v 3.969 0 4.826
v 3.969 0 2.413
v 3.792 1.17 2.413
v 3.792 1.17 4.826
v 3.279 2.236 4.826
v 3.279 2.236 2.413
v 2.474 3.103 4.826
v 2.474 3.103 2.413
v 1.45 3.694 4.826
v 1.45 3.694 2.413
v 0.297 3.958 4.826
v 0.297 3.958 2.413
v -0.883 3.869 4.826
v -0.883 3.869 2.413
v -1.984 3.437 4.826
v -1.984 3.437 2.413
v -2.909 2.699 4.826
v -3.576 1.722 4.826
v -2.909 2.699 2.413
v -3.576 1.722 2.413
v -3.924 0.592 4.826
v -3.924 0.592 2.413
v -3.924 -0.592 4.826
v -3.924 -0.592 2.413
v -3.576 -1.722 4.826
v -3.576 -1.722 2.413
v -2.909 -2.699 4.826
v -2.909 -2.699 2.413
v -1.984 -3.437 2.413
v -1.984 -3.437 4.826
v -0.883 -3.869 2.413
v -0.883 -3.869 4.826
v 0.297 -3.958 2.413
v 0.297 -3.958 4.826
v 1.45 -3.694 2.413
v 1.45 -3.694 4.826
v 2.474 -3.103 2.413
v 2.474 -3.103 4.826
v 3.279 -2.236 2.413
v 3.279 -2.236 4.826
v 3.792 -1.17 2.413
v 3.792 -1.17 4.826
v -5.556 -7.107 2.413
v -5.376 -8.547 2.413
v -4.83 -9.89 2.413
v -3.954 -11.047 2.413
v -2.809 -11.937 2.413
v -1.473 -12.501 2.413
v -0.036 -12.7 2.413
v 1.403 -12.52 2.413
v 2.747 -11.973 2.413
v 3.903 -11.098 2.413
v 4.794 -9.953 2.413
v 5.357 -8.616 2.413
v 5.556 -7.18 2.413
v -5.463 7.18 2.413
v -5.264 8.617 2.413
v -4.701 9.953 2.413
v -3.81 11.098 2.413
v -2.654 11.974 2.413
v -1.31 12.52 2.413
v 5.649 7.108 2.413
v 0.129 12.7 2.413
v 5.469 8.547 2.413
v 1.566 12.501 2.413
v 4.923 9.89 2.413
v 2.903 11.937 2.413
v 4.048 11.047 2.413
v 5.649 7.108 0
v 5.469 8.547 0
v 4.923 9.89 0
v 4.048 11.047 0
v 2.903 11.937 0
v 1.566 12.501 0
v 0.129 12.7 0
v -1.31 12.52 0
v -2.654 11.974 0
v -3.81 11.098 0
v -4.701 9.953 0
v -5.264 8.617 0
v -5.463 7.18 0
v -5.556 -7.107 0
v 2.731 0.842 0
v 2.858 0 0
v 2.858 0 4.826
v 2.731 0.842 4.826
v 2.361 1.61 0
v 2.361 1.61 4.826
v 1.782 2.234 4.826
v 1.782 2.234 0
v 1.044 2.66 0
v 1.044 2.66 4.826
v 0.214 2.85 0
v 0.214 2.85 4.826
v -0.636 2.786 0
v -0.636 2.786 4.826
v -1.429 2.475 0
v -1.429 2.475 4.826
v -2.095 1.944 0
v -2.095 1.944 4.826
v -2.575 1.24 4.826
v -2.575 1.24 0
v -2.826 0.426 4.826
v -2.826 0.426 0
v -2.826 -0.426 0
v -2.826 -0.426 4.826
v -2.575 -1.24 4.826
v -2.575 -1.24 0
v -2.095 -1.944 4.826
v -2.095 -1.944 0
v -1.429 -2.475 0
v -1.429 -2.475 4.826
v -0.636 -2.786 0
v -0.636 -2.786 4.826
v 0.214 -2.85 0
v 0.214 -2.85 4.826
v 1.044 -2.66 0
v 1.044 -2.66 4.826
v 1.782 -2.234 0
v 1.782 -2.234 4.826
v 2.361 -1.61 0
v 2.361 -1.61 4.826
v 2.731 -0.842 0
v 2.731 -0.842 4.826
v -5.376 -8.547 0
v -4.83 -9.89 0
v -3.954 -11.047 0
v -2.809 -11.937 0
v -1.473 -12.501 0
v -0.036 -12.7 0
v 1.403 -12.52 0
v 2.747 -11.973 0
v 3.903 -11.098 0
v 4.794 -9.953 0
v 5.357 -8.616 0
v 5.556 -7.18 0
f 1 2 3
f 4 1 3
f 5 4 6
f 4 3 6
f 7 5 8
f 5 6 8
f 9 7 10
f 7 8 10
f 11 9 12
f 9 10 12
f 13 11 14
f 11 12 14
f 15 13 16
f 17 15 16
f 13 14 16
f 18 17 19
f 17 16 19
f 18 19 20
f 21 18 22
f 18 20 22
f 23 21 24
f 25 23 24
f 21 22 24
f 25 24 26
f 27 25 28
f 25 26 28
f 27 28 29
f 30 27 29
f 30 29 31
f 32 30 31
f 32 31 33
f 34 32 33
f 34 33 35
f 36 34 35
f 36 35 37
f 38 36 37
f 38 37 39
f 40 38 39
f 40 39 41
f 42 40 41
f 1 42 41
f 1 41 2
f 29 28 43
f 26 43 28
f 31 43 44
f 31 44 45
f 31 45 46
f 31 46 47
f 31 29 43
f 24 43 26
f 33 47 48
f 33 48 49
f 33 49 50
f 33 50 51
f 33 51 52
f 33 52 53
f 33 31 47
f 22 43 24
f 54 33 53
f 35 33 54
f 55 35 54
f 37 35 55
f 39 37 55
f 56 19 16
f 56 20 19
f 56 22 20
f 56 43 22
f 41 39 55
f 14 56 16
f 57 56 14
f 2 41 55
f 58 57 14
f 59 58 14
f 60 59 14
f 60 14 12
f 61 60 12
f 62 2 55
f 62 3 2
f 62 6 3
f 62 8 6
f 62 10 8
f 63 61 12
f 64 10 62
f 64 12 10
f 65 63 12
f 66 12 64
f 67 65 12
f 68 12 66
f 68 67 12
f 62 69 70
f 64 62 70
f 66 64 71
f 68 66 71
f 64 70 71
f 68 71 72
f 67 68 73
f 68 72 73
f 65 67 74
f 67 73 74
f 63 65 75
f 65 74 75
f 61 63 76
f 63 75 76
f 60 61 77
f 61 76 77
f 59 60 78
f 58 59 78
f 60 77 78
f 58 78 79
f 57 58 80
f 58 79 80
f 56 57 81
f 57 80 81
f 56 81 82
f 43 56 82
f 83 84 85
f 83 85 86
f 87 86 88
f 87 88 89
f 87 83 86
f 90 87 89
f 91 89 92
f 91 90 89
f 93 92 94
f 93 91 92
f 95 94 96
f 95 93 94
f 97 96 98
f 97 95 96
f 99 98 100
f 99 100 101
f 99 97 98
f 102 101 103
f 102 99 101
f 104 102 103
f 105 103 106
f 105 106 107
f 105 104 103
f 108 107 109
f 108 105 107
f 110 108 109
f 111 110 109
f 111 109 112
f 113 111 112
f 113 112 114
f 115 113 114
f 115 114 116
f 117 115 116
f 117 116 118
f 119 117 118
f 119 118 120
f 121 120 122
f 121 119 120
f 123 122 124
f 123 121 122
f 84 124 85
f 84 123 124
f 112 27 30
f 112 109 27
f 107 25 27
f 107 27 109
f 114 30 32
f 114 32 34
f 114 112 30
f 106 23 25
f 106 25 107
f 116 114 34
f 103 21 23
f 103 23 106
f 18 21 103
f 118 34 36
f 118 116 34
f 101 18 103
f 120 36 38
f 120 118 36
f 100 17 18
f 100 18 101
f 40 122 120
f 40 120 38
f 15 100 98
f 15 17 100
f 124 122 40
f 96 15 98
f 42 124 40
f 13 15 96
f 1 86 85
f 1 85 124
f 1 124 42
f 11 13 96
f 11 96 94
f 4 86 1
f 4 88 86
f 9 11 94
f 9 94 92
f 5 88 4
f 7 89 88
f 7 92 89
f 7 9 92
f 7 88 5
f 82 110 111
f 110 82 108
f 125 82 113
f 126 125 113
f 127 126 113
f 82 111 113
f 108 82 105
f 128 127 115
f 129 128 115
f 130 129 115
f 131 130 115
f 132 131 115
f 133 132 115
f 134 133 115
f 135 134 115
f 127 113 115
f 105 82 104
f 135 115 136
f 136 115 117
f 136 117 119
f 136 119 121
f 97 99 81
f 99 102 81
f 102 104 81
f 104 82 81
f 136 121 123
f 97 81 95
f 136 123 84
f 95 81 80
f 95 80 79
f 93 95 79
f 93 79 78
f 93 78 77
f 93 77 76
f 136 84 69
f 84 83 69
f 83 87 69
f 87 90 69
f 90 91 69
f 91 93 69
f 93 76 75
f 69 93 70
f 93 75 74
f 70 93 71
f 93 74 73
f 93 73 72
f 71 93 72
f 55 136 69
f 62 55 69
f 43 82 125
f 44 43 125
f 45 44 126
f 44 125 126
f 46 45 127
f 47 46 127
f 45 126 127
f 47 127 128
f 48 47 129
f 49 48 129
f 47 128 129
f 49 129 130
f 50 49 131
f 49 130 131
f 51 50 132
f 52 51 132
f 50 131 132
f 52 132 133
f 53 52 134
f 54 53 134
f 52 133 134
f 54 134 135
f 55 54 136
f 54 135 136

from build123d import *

# Parameters (mm, degrees)
F0_R     = 3.96875
F0_R_2   = 2.8575
F1_DEPTH = 4.826
F2_DEPTH = 2.413


with BuildPart() as f1:
    # F0 (on Top) → F1 (new body)
    with BuildSketch(Plane.XY):
        Circle(F0_R)
        Circle(F0_R_2, mode=Mode.SUBTRACT)
    extrude(amount=F1_DEPTH)

    # F0 (on Top) → F2 (join)
    with BuildSketch(Plane.XY):
        with BuildLine():
            ThreePointArc((5.649248, 7.107538), (0.129327, 12.699882), (-5.463016, 7.179962))
            Line((-5.463016, 7.179962), (-5.556132, -7.107235))
            ThreePointArc((-5.556132, -7.107235), (-0.036212, -12.699579), (5.556132, -7.179658))
            Line((5.556132, -7.179658), (5.649248, 7.107538))
        make_face()
        Circle(F0_R, mode=Mode.SUBTRACT)
    extrude(amount=F2_DEPTH)


solid = f1.part
